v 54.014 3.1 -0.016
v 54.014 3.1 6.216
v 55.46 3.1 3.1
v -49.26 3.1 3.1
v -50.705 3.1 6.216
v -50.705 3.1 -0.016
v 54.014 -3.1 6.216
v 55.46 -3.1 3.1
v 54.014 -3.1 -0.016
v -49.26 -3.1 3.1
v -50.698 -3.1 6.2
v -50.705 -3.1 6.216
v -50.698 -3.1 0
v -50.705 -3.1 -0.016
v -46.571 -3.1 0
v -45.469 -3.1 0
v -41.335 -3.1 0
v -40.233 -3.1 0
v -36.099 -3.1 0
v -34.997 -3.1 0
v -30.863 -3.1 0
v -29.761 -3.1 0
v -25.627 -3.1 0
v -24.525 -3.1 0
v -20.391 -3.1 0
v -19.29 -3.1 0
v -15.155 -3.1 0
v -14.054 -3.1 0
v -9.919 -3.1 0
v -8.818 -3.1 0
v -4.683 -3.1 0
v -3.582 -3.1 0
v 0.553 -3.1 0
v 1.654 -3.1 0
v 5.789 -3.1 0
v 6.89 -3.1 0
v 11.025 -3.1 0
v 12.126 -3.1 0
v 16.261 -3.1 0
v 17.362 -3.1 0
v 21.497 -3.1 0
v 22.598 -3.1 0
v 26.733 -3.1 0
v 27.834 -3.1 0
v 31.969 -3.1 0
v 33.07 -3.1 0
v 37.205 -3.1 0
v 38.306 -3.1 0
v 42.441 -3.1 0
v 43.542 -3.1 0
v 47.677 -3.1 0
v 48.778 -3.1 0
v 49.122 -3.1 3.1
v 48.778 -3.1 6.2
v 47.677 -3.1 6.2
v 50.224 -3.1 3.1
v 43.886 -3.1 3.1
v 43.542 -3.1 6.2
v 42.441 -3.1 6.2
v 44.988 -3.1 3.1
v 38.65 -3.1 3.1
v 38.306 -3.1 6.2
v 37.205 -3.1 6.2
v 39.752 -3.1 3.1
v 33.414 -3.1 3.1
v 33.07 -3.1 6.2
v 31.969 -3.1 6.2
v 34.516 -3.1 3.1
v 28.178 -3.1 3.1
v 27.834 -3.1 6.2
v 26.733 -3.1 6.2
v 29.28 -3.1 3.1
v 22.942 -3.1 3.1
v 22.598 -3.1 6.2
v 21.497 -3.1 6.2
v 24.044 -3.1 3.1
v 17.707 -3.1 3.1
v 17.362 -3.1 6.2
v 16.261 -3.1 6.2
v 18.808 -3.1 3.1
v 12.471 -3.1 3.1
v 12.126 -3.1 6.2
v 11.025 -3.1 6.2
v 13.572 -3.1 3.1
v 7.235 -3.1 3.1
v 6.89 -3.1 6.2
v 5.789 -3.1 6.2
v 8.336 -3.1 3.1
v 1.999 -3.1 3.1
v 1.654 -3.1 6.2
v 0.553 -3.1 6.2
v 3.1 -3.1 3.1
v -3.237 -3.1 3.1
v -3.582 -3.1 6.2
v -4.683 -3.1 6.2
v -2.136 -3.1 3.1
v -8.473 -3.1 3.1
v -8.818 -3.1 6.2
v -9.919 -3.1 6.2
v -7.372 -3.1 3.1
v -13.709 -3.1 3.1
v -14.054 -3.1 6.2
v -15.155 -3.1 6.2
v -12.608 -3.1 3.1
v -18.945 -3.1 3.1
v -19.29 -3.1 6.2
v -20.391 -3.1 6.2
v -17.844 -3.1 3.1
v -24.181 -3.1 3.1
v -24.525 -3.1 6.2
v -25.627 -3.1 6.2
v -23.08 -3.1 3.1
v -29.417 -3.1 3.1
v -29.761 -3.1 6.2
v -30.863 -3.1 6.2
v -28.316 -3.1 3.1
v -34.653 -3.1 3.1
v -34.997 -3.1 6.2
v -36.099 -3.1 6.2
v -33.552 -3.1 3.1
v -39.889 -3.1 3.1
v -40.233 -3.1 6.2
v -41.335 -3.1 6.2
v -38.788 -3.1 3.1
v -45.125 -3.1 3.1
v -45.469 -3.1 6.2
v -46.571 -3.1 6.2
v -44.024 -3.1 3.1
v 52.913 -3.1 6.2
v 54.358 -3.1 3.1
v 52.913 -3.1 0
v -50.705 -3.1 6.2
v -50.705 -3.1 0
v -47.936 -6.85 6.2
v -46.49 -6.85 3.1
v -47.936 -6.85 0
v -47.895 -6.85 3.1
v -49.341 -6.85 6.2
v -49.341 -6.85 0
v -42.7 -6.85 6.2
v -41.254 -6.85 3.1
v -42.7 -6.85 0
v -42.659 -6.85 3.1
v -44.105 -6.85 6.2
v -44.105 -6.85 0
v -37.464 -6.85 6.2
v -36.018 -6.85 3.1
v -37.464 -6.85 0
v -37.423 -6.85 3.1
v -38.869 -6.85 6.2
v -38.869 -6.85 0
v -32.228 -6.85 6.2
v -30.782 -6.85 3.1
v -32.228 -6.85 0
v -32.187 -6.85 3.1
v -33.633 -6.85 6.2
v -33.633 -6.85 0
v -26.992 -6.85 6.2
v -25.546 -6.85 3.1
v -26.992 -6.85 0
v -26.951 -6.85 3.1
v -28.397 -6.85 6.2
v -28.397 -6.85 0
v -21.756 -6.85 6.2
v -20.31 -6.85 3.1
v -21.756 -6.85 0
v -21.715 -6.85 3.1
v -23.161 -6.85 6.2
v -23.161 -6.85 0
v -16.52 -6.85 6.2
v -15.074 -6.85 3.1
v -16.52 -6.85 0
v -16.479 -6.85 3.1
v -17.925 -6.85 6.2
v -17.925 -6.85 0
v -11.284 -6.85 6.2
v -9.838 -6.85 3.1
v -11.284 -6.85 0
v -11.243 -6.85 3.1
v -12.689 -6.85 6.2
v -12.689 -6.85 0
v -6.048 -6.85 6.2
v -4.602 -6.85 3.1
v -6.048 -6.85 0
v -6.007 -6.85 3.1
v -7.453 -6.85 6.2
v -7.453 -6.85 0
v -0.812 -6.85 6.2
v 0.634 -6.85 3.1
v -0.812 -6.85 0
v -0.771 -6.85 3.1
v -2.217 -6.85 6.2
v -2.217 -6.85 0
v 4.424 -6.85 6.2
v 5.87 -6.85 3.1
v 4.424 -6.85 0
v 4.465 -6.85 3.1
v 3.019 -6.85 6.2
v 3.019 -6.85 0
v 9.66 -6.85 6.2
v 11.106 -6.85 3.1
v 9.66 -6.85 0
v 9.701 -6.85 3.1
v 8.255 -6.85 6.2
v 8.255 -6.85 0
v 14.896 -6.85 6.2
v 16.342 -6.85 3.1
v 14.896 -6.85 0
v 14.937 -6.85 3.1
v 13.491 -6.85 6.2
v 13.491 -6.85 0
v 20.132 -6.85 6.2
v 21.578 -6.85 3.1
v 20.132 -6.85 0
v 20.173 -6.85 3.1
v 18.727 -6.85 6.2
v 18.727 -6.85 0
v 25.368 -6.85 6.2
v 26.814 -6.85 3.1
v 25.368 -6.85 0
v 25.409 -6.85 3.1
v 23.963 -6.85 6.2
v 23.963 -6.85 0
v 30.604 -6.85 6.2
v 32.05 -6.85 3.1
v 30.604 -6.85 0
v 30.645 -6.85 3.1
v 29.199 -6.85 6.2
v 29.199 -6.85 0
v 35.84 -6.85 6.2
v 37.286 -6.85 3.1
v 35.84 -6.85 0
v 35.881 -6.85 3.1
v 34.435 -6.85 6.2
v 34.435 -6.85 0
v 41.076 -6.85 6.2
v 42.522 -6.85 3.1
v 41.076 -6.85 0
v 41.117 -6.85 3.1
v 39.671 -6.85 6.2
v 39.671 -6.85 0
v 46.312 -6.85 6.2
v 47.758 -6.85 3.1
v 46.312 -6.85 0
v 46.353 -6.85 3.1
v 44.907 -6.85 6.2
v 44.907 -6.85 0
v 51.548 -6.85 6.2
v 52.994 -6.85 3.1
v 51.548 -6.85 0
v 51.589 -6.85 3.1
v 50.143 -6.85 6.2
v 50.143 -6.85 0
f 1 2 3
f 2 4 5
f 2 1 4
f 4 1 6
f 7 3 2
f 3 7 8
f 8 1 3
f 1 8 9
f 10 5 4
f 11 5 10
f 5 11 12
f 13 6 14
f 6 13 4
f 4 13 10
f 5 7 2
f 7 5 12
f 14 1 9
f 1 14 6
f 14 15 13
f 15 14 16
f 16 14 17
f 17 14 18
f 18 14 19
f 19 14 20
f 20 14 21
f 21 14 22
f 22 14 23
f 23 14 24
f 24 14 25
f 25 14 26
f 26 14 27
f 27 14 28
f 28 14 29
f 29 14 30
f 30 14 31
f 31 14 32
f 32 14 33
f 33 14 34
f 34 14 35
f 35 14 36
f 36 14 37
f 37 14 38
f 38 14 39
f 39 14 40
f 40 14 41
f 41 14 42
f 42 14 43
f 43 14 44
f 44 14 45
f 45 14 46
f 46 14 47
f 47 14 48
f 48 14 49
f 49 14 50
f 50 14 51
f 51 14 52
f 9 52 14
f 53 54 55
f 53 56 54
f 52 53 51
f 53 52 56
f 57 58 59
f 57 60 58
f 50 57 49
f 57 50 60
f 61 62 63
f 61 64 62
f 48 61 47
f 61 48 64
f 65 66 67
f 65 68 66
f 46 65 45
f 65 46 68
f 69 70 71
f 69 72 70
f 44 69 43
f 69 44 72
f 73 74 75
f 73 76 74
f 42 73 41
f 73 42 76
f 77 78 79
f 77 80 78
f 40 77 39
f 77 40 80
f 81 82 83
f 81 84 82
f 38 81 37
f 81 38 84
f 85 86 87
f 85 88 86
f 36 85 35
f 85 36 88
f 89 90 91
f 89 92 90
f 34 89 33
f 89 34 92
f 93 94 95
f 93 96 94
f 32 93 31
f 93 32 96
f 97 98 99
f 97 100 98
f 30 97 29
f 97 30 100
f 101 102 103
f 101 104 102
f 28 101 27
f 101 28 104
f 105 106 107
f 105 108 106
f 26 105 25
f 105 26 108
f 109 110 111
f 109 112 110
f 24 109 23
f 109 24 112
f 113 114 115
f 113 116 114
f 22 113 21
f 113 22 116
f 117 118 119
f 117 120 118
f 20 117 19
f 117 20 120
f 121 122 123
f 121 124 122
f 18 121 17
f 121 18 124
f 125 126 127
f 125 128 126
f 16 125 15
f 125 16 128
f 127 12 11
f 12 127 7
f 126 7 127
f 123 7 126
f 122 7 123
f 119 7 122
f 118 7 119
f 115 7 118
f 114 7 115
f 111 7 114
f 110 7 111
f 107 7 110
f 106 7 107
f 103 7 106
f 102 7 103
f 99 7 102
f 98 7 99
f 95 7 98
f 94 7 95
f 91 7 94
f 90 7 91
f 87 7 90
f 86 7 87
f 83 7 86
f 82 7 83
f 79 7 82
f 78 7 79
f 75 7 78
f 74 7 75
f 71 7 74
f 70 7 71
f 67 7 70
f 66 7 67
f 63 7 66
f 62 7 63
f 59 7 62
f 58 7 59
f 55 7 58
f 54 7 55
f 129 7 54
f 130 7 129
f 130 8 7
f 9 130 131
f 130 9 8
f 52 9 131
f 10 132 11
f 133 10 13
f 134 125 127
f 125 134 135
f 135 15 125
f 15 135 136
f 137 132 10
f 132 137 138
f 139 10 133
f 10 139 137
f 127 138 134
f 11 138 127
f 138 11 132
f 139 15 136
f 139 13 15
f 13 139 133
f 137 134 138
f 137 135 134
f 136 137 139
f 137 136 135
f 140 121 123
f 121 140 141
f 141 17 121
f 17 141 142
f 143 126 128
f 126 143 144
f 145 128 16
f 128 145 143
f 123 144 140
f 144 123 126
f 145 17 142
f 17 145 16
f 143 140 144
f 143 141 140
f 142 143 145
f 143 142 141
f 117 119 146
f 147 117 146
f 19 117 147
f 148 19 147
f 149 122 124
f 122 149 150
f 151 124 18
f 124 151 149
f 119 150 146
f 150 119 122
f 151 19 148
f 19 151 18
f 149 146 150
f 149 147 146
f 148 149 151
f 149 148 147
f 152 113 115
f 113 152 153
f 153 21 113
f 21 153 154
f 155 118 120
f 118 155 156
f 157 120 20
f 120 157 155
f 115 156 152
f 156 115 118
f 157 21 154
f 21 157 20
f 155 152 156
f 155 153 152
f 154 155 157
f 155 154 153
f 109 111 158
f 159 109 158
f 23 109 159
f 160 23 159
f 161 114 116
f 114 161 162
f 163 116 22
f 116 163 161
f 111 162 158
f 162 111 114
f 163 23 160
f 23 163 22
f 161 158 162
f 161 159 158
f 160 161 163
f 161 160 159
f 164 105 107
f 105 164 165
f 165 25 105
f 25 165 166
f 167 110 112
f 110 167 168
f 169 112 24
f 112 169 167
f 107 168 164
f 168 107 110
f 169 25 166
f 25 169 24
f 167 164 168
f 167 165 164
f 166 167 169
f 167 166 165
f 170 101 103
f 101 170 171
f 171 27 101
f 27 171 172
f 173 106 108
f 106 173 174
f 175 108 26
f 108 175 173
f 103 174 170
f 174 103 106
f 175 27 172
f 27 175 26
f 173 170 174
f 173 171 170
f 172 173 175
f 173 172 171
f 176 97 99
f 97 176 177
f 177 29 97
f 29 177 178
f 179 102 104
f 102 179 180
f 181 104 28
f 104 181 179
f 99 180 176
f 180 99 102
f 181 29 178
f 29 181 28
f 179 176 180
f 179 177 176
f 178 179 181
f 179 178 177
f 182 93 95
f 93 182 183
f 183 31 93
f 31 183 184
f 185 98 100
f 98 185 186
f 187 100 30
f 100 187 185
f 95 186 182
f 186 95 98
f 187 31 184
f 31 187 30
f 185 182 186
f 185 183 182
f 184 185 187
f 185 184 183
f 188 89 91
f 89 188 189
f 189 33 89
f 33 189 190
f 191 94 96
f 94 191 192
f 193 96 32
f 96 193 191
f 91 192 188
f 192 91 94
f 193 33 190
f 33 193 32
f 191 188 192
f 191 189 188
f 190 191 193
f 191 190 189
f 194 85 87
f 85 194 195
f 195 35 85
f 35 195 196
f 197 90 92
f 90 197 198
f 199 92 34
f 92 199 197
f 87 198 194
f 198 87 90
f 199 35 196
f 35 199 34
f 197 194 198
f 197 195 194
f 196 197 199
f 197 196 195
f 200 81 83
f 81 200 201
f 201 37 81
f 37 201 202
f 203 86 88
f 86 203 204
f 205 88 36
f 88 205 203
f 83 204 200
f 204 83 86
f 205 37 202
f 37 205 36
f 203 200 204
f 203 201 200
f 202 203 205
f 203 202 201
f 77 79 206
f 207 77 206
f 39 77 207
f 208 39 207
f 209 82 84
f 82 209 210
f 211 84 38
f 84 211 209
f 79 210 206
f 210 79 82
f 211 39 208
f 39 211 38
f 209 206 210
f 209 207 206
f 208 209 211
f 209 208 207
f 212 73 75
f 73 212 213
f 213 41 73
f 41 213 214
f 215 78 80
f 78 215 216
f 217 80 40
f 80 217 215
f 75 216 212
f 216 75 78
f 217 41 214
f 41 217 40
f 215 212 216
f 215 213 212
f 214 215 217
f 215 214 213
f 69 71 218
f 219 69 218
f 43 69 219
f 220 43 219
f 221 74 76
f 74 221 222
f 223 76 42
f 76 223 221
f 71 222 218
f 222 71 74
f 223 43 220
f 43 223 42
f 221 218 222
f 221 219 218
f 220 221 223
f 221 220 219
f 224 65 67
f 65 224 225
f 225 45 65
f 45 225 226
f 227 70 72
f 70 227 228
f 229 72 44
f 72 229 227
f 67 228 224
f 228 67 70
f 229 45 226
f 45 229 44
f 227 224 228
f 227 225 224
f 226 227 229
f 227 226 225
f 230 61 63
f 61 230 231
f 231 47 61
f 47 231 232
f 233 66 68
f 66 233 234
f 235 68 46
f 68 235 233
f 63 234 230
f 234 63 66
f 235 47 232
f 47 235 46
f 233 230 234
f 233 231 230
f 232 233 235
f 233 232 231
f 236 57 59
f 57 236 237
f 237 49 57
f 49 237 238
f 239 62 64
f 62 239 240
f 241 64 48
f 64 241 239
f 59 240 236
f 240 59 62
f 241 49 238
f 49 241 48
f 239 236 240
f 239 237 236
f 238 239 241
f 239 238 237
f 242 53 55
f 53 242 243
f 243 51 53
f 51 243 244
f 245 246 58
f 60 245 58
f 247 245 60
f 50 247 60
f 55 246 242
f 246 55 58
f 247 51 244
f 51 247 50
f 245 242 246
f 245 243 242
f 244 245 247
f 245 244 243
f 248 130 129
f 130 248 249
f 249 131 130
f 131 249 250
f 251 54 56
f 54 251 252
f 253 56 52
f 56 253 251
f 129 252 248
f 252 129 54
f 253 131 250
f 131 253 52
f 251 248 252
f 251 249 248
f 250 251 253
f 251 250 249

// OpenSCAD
// Parametric Modular Rack Mark "Ckaos" Moissette
//Based on the work of MattMoses and Fdavies :
//http://forums.reprap.org/read.php?1,51452,52099#msg-52099
//and Forrest Higgs:
// http://technocraticanarchist.blogspot.com/2010/01/high-speed-alternative-to-belts.html
//It is licensed under the Creative Commons - GNU GPL license.
// © 2011 by Mark "Ckaos" Moissette
//more info at :www.kaosat.net and
//http://www.thingiverse.com/thing:6011



pi=3.1415926535897932384626433832795;
innerRadius=0;//shaft radius, in mm
borders=3.1;//how thick should the borders around the central "shaft" be, in mm
diametralPitch=12;
numberOfTeeth=20;
pressureAngle=20*pi/180;
centerAngle=25;//angle at center of teeth


//example usage
rack(innerRadius,borders,diametralPitch,numberOfTeeth,pressureAngle,centerAngle);



module rack(innerRadius,borders,P,N,PA,CA)
{
	// P = diametral pitch
	// N = number of teeth
	// PA = pressure angle in radians
	// x, y = linear offset distances
	a = 1/P; // addendum (also known as "module")
	d = 1.25/P; // dedendum (this is set by a standard)
	multiplier=20;//20
	height=(d+a)*multiplier;
	
	
	// find the tangent of pressure angle once
	tanPA = tan(PA*(180/pi));
	// length of bottom and top horizontal segments of tooth profile
	botL = (pi/P/2 - 2*d*tanPA)*multiplier;
	topL =( pi/P/2 - 2*a*tanPA)*multiplier;

	slantLng=tanPA*height;
	realBase=2*slantLng+topL;
	
	
	offset=topL+botL+2*slantLng;
	length=(realBase+botL)*N;

	supportSize=(innerRadius+borders)*2;

	//calculate tooth params
	basesegmentL=realBase/2;
	basesegmentW=supportSize/2;

	topsegmentL=topL/2;
	topsegmentW=supportSize/2;

	baseoffsetY=tan(CA)*basesegmentW;
	topoffsetY=tan(CA)*topsegmentW;
	
	//calculate support params

	totalSupportLength=(N)*(offset);
	supportL=totalSupportLength/2;
	supportW=supportSize/1.99;
	
	echo("Total length",totalSupportLength+baseoffsetY);
	echo("Total height",supportSize);

	
	rotate([90,90,0])
	{
	translate([-supportSize/2,supportSize/2,0])
	{
	union()
	{
		difference()
		{
			support(supportL,supportW,supportSize,baseoffsetY);
			rotate([90,90,0]) 
			{cylinder(h=length+10,r=innerRadius,center=true,$fn=100);}
		}

	
		for (i = [0:N-1]) 
		{
			translate([0,i*offset-length/2+realBase/2,supportSize/2+height/2]) 
			{	
				
				tooth(basesegmentL,basesegmentW,topsegmentL,topsegmentW,height,baseoffsetY,topoffsetY);
				
			}
		}
	}
	
	}
	}
}

module support(supportL,supportW,height,offsetY)
{
	 tooth(supportL,supportW,supportL,supportW,height,offsetY,offsetY);
}



module tooth(basesegmentL,basesegmentW,topsegmentL,topsegmentW,height,baseoffsetY,topoffsetY)//top : width*length, same for base
{
	
	////////////////
	basePT1=[
	-basesegmentW,
	basesegmentL-baseoffsetY,
	-height/2];

	basePT2=[
	0,
	basesegmentL,
	-height/2];

	basePT3=[
	basesegmentW,
	basesegmentL-baseoffsetY,
	-height/2];

	basePT4=[
	basesegmentW,
	basesegmentL-(baseoffsetY+basesegmentL*2),
	-height/2];
	
	basePT5=[
	0,
	-basesegmentL,
	-height/2];

	basePT6=[
	-basesegmentW,
	basesegmentL-(baseoffsetY+basesegmentL*2),
	-height/2];
	//////////////////////////
	topPT1=[
	-topsegmentW,
	topsegmentL-topoffsetY,
	height/2];

	topPT2=[
	0,
	topsegmentL,
	height/2];

	topPT3=[
	topsegmentW,
	topsegmentL-topoffsetY,
	height/2];

	topPT4=[
	topsegmentW,
	topsegmentL-(topoffsetY+topsegmentL*2),
	height/2];
	
	topPT5=[
	0,
	-topsegmentL,
	height/2];

	topPT6=[
	-topsegmentW,
	topsegmentL-(topoffsetY+topsegmentL*2),
	height/2];
	//////////////////////////

	//////////////////////////

	polyhedron(
	points=[
		basePT1,
		basePT2,
		basePT3,
		basePT4,
		basePT5,
		basePT6,
		topPT1,
		topPT2,
		topPT3,
		topPT4,
		topPT5,
		topPT6],
	triangles=[
	//base
	[5,1,0],
	[4,1,5],
	[4,2,1],
	[3,2,4],	

	//front
	[1,6,0],
	[7,6,1],
	[2,7,1],
	[8,7,2],
	//back
	[11,10,5],
	[5,10,4],
	[10,9,4],
	[4,9,3],	
	//side 1
	[0,11,5],
	[6,11,0],
	//side 2
	[3,8,2],
	[9,8,3],
	//top
	[9,10,8],
	[10,7,8],
	[11,7,10],
	[6,7,11],
	]
	);
}

module demo_gear(position,diametralPitch)
{
	wheelSize=12;
rotate([0,90,180])
translate(position)

{
gear (
	number_of_teeth=8,
	circular_pitch=300, 
	pressure_angle=19.34,
	gear_thickness=wheelSize/2,
	rim_thickness=wheelSize/2,
	hub_thickness=0,
	bore_diameter=2,
	backlash=0,twist=centerAngle,involute_facets=15);

translate([0,0,wheelSize/2])
rotate([0,0,-centerAngle])
gear (
	number_of_teeth=8,
	circular_pitch=300, 
	pressure_angle=19.34,
	gear_thickness=wheelSize/2,
	rim_thickness=wheelSize/2,
	hub_thickness=0,
	bore_diameter=2,
	backlash=0,twist=-centerAngle,involute_facets=15);

}

}
